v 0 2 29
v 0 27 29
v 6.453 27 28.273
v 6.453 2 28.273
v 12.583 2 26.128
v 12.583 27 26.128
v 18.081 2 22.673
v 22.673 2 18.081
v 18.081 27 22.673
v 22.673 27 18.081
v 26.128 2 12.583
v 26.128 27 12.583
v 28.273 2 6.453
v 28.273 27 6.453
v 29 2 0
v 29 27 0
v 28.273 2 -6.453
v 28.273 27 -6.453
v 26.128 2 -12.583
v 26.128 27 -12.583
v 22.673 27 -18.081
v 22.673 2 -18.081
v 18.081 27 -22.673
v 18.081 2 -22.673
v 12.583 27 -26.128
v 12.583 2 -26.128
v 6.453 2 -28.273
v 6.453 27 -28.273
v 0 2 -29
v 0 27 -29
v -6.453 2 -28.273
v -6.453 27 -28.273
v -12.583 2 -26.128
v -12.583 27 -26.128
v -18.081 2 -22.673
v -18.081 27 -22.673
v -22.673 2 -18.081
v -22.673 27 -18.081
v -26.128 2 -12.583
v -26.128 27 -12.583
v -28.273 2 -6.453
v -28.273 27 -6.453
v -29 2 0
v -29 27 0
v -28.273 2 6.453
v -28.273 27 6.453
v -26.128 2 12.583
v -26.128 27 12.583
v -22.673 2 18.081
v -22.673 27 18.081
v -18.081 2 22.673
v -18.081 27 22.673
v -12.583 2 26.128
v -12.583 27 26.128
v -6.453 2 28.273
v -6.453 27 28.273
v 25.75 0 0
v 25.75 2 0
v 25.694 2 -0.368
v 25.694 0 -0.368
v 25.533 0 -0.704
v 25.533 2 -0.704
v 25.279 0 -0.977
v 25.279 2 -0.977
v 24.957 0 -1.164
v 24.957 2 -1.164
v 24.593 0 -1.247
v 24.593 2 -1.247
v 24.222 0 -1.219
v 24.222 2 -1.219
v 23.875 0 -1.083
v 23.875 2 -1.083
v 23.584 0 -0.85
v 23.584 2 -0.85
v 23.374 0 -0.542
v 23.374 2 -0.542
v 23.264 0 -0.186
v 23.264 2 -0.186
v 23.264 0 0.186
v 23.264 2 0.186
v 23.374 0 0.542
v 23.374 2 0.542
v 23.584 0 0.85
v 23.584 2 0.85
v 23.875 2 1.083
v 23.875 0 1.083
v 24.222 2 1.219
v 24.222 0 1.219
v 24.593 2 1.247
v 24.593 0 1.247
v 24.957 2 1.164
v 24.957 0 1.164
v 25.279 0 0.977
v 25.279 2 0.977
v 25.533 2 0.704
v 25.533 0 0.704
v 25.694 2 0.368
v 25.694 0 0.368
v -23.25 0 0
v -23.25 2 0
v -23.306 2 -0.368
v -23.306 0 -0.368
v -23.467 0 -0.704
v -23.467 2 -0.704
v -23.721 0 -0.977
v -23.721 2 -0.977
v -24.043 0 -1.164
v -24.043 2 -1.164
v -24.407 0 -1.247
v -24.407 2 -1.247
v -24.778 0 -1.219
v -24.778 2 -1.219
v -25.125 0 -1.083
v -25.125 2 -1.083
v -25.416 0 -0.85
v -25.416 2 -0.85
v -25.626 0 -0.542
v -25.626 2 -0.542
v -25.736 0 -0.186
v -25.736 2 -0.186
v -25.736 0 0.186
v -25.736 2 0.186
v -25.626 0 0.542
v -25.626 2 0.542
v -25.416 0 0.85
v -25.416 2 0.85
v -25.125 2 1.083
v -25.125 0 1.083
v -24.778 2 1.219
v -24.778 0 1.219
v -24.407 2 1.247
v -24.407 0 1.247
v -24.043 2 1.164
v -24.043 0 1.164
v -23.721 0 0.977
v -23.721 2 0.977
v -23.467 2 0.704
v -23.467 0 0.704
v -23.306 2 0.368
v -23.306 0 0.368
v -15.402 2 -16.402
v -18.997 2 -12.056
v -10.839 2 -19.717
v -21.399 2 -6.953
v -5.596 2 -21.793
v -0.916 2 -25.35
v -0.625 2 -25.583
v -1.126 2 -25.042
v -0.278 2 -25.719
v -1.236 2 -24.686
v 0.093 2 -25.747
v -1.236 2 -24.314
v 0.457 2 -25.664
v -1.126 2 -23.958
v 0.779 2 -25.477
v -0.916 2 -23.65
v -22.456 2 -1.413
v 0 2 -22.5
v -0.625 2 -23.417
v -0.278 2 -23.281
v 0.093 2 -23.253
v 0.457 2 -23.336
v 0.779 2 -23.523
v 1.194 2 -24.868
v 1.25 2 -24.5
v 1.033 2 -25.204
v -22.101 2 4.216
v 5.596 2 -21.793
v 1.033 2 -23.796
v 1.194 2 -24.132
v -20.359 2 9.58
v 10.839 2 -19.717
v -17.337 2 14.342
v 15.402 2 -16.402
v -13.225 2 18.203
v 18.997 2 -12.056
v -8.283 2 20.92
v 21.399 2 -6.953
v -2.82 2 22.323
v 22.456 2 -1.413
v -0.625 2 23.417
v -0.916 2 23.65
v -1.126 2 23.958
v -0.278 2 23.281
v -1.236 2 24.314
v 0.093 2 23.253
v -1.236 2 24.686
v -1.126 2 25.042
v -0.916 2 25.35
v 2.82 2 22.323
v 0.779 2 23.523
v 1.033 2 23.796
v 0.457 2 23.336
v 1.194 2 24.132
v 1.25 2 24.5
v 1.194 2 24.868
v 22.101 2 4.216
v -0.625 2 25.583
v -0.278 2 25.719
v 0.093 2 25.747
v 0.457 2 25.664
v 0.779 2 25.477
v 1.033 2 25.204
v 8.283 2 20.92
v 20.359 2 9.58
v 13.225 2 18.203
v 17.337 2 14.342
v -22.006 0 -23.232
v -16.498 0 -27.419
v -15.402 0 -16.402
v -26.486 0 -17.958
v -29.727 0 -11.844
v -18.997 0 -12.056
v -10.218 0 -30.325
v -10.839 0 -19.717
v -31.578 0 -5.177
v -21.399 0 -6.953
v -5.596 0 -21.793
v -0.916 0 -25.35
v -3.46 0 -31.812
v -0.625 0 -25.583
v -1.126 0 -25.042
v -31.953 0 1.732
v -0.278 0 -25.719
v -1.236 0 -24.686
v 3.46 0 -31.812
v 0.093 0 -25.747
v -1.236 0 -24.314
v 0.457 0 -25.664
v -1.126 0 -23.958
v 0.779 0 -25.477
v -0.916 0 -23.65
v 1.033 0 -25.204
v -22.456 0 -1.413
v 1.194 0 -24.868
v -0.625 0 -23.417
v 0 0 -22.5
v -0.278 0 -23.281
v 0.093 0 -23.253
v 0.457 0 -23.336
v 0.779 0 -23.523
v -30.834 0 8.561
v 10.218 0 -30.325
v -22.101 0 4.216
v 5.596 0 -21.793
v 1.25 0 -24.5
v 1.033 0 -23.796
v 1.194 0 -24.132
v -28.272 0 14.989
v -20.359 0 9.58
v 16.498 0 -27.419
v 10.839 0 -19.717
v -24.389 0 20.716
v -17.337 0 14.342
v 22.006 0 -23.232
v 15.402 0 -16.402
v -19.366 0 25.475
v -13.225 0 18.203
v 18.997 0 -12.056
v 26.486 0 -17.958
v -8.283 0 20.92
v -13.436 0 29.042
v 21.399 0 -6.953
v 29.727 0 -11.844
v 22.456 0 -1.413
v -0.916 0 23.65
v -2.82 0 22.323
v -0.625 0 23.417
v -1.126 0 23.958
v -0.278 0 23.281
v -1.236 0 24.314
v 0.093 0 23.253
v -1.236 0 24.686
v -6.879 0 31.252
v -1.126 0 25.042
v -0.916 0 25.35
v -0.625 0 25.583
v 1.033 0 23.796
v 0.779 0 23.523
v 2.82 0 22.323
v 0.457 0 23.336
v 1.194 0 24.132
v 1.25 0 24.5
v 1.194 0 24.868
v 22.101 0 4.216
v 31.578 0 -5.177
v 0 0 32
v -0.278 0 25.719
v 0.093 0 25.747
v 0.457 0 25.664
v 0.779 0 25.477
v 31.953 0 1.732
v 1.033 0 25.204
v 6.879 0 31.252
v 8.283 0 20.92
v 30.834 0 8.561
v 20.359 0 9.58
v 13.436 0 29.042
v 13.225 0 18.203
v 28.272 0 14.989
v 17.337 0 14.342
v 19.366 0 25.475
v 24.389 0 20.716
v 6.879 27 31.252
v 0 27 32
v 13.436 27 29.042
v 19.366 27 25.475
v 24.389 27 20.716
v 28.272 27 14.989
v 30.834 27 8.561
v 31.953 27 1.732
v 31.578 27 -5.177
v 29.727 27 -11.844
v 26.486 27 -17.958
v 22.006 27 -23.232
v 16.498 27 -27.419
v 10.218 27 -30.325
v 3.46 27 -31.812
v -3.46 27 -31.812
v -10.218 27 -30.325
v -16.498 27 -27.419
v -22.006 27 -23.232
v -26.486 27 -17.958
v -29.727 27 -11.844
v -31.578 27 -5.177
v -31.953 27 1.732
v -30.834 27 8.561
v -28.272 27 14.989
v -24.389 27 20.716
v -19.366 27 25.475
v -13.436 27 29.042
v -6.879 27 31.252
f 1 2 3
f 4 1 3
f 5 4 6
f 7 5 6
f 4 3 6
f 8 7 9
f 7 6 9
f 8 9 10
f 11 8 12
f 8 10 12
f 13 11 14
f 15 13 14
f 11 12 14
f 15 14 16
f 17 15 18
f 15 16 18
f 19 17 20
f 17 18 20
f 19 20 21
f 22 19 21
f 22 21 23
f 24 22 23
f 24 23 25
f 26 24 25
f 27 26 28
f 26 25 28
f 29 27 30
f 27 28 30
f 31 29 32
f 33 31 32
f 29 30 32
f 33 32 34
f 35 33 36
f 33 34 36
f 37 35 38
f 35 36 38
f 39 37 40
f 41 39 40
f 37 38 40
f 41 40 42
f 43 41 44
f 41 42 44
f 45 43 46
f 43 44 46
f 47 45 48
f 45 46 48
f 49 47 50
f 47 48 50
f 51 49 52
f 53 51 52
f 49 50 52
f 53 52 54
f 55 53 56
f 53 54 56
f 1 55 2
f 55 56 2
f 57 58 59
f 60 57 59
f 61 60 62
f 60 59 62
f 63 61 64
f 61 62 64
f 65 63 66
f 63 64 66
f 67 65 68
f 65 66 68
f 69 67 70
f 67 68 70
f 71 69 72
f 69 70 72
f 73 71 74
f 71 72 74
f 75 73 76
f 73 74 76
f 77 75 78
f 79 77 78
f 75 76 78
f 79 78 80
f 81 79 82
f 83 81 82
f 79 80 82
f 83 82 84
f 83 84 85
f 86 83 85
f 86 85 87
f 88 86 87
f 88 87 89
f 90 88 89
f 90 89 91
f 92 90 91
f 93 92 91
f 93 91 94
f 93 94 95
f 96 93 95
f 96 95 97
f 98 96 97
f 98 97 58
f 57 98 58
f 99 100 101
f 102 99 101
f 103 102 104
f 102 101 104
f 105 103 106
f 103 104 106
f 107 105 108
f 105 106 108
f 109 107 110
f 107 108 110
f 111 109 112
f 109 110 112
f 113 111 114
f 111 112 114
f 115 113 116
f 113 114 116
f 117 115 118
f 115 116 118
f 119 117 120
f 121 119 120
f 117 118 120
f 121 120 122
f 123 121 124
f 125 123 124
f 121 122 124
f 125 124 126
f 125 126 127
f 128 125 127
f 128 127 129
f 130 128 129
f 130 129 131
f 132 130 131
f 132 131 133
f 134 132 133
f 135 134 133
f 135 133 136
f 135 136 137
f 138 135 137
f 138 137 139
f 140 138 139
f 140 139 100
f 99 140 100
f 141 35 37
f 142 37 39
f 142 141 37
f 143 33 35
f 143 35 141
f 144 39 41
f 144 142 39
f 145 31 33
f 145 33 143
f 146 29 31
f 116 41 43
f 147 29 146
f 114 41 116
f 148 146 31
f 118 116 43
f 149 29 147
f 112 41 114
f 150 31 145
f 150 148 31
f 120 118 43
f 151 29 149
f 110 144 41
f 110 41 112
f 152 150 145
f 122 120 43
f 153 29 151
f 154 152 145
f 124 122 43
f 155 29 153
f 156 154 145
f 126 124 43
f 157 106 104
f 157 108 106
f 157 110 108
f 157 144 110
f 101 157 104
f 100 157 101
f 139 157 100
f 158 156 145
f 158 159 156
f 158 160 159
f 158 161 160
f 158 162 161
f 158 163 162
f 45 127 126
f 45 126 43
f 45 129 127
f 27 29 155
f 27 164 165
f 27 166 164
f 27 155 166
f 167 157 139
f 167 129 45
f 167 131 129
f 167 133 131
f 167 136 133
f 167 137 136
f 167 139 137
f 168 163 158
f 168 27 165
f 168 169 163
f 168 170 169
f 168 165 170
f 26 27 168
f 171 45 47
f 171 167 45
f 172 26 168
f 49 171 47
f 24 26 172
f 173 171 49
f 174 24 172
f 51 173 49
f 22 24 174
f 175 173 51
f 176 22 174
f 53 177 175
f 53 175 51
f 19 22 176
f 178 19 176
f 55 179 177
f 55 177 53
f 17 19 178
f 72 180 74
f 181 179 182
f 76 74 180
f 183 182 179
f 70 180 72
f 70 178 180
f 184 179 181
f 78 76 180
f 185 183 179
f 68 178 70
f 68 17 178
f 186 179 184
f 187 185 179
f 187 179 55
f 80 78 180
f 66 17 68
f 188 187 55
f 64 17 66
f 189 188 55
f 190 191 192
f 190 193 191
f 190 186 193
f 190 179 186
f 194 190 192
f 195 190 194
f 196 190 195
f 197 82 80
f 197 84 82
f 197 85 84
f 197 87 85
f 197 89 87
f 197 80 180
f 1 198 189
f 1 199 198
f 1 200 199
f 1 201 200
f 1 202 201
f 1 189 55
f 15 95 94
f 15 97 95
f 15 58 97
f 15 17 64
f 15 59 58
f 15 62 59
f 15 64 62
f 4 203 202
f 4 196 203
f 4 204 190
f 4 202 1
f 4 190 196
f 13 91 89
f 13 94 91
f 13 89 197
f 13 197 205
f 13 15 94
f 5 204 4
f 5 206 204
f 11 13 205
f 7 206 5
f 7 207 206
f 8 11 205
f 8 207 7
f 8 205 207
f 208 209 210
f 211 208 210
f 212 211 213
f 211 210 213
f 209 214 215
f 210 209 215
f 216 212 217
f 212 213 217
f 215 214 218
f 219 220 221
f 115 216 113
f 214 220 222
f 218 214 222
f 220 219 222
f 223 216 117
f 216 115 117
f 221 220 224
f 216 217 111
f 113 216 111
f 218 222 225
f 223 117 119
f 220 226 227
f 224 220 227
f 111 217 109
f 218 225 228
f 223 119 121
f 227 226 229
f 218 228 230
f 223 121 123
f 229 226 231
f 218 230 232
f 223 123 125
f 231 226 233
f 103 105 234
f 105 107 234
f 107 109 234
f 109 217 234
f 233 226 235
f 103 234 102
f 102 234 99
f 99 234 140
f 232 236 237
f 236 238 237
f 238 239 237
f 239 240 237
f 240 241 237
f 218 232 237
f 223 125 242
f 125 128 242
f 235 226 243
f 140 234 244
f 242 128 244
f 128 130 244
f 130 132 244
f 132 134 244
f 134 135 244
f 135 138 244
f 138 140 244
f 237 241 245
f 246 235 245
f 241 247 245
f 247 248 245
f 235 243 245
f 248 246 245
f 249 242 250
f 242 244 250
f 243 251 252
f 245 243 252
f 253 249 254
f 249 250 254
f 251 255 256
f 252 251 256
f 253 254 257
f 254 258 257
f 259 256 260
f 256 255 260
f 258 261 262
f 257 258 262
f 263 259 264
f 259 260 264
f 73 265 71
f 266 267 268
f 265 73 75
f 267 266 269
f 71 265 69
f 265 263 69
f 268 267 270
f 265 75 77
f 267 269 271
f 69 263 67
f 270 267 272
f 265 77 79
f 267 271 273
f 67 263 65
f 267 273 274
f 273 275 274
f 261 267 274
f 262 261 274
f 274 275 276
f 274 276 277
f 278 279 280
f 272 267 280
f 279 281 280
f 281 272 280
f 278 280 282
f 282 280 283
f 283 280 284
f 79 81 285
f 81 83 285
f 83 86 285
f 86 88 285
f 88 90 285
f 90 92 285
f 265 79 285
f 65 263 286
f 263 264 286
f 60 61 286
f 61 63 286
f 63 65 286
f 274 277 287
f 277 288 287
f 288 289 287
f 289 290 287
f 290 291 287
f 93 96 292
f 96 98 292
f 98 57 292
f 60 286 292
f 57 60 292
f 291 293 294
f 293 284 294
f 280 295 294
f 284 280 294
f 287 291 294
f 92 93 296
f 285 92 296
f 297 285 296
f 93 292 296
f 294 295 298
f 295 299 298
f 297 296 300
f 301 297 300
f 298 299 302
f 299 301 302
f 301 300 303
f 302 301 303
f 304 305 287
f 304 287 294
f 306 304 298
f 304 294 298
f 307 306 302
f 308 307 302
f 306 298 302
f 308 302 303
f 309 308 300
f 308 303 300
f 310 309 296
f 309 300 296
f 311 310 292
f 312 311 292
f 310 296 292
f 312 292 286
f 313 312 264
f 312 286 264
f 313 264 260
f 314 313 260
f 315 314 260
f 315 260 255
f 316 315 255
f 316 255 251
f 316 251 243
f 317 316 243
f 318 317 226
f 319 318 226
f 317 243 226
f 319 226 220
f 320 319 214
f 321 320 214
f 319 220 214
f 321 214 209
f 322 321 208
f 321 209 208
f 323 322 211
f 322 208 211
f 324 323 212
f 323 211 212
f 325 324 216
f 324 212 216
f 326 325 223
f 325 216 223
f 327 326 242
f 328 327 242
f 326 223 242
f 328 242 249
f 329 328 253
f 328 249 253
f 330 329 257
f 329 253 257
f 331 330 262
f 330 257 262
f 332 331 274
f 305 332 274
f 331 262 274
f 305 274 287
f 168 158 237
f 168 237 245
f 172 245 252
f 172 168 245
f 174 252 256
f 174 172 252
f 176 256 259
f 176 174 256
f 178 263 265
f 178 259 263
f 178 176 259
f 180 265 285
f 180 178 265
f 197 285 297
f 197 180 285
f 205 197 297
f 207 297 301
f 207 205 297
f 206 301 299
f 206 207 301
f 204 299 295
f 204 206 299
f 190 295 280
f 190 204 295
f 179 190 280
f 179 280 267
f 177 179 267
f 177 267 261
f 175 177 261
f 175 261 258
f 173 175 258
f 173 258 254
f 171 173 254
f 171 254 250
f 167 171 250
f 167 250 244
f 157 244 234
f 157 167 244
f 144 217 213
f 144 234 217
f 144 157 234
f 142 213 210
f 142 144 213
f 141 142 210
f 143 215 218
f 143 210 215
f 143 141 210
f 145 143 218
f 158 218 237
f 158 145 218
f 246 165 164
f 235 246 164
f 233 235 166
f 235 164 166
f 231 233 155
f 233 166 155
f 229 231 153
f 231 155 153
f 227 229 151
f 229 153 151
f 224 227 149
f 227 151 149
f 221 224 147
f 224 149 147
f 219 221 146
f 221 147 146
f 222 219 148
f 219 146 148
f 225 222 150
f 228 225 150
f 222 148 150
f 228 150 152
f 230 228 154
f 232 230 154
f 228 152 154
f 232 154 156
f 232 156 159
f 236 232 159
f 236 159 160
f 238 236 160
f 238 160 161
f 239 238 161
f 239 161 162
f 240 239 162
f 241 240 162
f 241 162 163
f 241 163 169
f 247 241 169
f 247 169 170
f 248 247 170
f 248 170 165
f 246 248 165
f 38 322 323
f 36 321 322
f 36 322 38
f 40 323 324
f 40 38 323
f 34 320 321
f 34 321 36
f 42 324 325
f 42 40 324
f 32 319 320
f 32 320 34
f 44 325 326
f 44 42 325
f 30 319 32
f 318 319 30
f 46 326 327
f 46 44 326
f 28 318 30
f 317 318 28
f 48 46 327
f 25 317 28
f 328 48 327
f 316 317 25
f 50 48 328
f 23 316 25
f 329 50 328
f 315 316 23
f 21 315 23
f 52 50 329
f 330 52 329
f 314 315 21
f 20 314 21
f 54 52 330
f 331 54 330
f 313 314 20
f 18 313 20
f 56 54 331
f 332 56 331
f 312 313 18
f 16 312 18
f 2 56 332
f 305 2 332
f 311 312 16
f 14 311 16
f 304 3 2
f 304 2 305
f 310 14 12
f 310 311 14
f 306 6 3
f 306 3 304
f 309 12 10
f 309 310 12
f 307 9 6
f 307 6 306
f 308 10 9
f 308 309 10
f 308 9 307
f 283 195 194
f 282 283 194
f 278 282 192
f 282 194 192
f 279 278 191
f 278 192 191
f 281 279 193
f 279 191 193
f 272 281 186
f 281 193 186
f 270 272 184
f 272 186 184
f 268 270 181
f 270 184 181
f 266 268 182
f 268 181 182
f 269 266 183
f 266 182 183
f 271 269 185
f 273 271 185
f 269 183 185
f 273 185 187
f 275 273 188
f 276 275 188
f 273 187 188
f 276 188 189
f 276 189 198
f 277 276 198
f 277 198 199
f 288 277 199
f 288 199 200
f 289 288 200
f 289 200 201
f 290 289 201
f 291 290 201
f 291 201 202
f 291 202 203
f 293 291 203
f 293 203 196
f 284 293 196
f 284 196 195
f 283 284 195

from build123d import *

# Parameters (mm, degrees)
SKETCH_1_R               = 32
EXTRUDE_1_DEPTH          = 27
CUT_EXTRUDE_3_DEPTH      = 51.318982502
CUT_EXTRUDE_3_DEPTH_BACK = 51.318982502
SKETCH_5_R               = 22.5
SKETCH_6_R               = 29
CUT_EXTRUDE_4_DEPTH      = 25
HOLE_WIZARD_M3_1_D       = 2.5


with BuildPart() as part:
    # 草图1 → 凸台-拉伸1 (new body)
    with BuildSketch(Plane(origin=(0, 0, 0), x_dir=(1, 0, 0), z_dir=(0, 1, 0))):
        with Locations(Location((0, 0, 0), (0, 0, 270))):
            Circle(SKETCH_1_R)
    extrude(amount=EXTRUDE_1_DEPTH)

    # 草图5 → 切除-拉伸3 (cut, two sides: drawn at the far end of the back side and taken through both)
    with BuildSketch(Plane(origin=(0, 5, 0), x_dir=(-1, 0, 0), z_dir=(0, -1, 0)).offset(-CUT_EXTRUDE_3_DEPTH_BACK)):
        with Locations(Location((0, 0, 0), (0, 0, 90))):
            Circle(SKETCH_5_R)
    extrude(amount=CUT_EXTRUDE_3_DEPTH + CUT_EXTRUDE_3_DEPTH_BACK, mode=Mode.SUBTRACT)

    # 草图6 → 切除-拉伸4 (cut)
    with BuildSketch(Plane(origin=(0, 27, 0), x_dir=(1, 0, 0), z_dir=(0, 1, 0))):
        with Locations(Location((0, 0, 0), (0, 0, 270))):
            Circle(SKETCH_6_R)
    extrude(amount=-CUT_EXTRUDE_4_DEPTH, mode=Mode.SUBTRACT)

    # M3 螺纹孔1 (through all)
    with Locations(Plane(origin=(0, 0, 0), x_dir=(-1, 0, 0), z_dir=(0, -1, 0))):
        with Locations((24.5, 0), (0, 24.5), (-24.5, 0), (0, -24.5)):
            Hole(HOLE_WIZARD_M3_1_D / 2)


solid = part.part
